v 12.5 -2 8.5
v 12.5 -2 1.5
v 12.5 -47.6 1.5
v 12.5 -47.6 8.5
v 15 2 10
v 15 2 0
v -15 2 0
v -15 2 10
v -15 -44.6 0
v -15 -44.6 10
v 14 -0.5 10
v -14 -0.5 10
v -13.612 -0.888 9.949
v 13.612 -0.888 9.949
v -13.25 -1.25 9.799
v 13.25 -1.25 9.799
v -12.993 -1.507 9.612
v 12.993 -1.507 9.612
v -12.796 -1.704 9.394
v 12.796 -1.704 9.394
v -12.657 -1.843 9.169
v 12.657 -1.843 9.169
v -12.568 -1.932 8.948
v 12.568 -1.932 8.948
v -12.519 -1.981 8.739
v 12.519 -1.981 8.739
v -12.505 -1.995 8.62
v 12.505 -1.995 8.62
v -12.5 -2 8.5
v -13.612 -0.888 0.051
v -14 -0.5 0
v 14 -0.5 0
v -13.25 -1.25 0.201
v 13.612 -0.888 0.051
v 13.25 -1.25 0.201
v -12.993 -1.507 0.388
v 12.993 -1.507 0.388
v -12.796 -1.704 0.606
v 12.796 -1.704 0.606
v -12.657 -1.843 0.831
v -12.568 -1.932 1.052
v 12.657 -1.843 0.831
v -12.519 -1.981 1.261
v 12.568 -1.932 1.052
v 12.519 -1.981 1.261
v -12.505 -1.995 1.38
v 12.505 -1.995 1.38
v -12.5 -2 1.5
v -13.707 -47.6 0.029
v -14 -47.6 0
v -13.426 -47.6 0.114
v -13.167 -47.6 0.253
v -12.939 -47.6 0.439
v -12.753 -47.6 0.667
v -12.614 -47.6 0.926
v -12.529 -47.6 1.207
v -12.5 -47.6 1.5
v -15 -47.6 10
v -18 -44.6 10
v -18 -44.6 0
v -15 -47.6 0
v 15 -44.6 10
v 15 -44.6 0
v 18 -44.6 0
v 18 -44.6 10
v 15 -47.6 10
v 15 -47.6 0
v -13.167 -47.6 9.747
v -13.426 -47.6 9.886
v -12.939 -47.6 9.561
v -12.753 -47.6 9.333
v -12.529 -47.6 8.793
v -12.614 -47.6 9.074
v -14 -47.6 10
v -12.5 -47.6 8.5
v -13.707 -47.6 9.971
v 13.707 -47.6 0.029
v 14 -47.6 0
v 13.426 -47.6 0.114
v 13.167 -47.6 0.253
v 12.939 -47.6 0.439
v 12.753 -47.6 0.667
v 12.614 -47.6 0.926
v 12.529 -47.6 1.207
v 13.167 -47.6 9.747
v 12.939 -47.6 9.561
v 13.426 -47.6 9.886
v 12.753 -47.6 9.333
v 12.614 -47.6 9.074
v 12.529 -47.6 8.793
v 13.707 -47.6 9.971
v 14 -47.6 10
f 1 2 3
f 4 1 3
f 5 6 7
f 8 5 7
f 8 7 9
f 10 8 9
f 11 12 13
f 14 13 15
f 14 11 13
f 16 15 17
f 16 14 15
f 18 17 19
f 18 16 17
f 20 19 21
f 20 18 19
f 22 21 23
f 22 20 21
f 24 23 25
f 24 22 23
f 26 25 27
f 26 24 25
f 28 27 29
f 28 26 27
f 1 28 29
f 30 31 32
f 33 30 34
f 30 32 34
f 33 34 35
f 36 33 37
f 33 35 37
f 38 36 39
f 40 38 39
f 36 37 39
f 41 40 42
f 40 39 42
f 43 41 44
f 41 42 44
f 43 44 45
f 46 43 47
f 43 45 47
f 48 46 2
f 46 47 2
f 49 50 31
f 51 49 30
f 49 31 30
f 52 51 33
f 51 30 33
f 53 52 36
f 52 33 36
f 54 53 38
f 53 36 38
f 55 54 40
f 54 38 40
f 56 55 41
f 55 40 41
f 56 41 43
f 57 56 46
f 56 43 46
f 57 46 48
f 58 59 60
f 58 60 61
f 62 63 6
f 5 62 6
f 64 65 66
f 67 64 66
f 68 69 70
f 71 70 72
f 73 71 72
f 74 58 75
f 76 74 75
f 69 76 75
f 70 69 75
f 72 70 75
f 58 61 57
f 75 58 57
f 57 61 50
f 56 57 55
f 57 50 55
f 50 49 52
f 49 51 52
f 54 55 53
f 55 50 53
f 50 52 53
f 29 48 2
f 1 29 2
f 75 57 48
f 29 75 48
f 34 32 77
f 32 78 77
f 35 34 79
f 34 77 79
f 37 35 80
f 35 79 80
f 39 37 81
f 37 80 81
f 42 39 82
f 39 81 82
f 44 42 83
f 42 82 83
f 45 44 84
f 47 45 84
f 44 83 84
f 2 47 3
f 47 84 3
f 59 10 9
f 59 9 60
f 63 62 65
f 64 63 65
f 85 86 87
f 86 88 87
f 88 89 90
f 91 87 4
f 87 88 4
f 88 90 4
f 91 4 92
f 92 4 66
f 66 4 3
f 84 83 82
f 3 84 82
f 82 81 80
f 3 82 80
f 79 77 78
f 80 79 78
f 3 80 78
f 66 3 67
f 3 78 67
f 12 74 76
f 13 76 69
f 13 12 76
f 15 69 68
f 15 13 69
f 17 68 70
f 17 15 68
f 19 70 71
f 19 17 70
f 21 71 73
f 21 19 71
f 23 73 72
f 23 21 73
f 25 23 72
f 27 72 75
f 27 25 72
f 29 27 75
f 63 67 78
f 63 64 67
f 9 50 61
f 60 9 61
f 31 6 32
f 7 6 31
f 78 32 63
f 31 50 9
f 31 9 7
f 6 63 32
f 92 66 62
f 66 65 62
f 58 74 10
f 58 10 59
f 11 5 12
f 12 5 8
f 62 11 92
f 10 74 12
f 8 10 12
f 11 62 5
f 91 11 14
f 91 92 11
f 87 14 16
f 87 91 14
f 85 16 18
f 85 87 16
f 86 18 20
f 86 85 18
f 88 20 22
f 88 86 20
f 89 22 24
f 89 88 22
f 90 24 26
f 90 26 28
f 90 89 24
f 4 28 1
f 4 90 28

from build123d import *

# Parameters (mm, degrees)
BOSS_EXTRUDE1_DEPTH = 10
BOSS_EXTRUDE3_DEPTH = 10
FILLET3_R           = 1.5


with BuildPart() as part:
    # Sketch1 → Boss-Extrude1 (new body)
    with BuildSketch(Plane.XY):
        Polygon((-12.5, -2), (12.5, -2), (12.5, -47.6), (15, -47.6), (15, -2), (15, 2), (-15, 2), (-15, -2), (-15, -47.6), (-12.5, -47.6), align=None)
    extrude(amount=BOSS_EXTRUDE1_DEPTH)

    # Sketch2 → Boss-Extrude3 (add)
    with BuildSketch(Plane.XY.offset(10)):
        Polygon((18, -44.6), (15, -47.6), (15, -44.6), align=None)
        Polygon((-15, -47.6), (-15, -44.6), (-18, -44.6), align=None)
    extrude(amount=-BOSS_EXTRUDE3_DEPTH)

    # Fillet3
    fillet3_edges = [part.edges().sort_by_distance(p)[0] for p in [
        (12.5, -24.8, 0),
        (0, -2, 0),
        (-12.5, -24.8, 0),
        (-12.5, -24.8, 10),
        (0, -2, 10),
        (12.5, -24.8, 10),
    ]]
    fillet(fillet3_edges, radius=FILLET3_R)


solid = part.part
